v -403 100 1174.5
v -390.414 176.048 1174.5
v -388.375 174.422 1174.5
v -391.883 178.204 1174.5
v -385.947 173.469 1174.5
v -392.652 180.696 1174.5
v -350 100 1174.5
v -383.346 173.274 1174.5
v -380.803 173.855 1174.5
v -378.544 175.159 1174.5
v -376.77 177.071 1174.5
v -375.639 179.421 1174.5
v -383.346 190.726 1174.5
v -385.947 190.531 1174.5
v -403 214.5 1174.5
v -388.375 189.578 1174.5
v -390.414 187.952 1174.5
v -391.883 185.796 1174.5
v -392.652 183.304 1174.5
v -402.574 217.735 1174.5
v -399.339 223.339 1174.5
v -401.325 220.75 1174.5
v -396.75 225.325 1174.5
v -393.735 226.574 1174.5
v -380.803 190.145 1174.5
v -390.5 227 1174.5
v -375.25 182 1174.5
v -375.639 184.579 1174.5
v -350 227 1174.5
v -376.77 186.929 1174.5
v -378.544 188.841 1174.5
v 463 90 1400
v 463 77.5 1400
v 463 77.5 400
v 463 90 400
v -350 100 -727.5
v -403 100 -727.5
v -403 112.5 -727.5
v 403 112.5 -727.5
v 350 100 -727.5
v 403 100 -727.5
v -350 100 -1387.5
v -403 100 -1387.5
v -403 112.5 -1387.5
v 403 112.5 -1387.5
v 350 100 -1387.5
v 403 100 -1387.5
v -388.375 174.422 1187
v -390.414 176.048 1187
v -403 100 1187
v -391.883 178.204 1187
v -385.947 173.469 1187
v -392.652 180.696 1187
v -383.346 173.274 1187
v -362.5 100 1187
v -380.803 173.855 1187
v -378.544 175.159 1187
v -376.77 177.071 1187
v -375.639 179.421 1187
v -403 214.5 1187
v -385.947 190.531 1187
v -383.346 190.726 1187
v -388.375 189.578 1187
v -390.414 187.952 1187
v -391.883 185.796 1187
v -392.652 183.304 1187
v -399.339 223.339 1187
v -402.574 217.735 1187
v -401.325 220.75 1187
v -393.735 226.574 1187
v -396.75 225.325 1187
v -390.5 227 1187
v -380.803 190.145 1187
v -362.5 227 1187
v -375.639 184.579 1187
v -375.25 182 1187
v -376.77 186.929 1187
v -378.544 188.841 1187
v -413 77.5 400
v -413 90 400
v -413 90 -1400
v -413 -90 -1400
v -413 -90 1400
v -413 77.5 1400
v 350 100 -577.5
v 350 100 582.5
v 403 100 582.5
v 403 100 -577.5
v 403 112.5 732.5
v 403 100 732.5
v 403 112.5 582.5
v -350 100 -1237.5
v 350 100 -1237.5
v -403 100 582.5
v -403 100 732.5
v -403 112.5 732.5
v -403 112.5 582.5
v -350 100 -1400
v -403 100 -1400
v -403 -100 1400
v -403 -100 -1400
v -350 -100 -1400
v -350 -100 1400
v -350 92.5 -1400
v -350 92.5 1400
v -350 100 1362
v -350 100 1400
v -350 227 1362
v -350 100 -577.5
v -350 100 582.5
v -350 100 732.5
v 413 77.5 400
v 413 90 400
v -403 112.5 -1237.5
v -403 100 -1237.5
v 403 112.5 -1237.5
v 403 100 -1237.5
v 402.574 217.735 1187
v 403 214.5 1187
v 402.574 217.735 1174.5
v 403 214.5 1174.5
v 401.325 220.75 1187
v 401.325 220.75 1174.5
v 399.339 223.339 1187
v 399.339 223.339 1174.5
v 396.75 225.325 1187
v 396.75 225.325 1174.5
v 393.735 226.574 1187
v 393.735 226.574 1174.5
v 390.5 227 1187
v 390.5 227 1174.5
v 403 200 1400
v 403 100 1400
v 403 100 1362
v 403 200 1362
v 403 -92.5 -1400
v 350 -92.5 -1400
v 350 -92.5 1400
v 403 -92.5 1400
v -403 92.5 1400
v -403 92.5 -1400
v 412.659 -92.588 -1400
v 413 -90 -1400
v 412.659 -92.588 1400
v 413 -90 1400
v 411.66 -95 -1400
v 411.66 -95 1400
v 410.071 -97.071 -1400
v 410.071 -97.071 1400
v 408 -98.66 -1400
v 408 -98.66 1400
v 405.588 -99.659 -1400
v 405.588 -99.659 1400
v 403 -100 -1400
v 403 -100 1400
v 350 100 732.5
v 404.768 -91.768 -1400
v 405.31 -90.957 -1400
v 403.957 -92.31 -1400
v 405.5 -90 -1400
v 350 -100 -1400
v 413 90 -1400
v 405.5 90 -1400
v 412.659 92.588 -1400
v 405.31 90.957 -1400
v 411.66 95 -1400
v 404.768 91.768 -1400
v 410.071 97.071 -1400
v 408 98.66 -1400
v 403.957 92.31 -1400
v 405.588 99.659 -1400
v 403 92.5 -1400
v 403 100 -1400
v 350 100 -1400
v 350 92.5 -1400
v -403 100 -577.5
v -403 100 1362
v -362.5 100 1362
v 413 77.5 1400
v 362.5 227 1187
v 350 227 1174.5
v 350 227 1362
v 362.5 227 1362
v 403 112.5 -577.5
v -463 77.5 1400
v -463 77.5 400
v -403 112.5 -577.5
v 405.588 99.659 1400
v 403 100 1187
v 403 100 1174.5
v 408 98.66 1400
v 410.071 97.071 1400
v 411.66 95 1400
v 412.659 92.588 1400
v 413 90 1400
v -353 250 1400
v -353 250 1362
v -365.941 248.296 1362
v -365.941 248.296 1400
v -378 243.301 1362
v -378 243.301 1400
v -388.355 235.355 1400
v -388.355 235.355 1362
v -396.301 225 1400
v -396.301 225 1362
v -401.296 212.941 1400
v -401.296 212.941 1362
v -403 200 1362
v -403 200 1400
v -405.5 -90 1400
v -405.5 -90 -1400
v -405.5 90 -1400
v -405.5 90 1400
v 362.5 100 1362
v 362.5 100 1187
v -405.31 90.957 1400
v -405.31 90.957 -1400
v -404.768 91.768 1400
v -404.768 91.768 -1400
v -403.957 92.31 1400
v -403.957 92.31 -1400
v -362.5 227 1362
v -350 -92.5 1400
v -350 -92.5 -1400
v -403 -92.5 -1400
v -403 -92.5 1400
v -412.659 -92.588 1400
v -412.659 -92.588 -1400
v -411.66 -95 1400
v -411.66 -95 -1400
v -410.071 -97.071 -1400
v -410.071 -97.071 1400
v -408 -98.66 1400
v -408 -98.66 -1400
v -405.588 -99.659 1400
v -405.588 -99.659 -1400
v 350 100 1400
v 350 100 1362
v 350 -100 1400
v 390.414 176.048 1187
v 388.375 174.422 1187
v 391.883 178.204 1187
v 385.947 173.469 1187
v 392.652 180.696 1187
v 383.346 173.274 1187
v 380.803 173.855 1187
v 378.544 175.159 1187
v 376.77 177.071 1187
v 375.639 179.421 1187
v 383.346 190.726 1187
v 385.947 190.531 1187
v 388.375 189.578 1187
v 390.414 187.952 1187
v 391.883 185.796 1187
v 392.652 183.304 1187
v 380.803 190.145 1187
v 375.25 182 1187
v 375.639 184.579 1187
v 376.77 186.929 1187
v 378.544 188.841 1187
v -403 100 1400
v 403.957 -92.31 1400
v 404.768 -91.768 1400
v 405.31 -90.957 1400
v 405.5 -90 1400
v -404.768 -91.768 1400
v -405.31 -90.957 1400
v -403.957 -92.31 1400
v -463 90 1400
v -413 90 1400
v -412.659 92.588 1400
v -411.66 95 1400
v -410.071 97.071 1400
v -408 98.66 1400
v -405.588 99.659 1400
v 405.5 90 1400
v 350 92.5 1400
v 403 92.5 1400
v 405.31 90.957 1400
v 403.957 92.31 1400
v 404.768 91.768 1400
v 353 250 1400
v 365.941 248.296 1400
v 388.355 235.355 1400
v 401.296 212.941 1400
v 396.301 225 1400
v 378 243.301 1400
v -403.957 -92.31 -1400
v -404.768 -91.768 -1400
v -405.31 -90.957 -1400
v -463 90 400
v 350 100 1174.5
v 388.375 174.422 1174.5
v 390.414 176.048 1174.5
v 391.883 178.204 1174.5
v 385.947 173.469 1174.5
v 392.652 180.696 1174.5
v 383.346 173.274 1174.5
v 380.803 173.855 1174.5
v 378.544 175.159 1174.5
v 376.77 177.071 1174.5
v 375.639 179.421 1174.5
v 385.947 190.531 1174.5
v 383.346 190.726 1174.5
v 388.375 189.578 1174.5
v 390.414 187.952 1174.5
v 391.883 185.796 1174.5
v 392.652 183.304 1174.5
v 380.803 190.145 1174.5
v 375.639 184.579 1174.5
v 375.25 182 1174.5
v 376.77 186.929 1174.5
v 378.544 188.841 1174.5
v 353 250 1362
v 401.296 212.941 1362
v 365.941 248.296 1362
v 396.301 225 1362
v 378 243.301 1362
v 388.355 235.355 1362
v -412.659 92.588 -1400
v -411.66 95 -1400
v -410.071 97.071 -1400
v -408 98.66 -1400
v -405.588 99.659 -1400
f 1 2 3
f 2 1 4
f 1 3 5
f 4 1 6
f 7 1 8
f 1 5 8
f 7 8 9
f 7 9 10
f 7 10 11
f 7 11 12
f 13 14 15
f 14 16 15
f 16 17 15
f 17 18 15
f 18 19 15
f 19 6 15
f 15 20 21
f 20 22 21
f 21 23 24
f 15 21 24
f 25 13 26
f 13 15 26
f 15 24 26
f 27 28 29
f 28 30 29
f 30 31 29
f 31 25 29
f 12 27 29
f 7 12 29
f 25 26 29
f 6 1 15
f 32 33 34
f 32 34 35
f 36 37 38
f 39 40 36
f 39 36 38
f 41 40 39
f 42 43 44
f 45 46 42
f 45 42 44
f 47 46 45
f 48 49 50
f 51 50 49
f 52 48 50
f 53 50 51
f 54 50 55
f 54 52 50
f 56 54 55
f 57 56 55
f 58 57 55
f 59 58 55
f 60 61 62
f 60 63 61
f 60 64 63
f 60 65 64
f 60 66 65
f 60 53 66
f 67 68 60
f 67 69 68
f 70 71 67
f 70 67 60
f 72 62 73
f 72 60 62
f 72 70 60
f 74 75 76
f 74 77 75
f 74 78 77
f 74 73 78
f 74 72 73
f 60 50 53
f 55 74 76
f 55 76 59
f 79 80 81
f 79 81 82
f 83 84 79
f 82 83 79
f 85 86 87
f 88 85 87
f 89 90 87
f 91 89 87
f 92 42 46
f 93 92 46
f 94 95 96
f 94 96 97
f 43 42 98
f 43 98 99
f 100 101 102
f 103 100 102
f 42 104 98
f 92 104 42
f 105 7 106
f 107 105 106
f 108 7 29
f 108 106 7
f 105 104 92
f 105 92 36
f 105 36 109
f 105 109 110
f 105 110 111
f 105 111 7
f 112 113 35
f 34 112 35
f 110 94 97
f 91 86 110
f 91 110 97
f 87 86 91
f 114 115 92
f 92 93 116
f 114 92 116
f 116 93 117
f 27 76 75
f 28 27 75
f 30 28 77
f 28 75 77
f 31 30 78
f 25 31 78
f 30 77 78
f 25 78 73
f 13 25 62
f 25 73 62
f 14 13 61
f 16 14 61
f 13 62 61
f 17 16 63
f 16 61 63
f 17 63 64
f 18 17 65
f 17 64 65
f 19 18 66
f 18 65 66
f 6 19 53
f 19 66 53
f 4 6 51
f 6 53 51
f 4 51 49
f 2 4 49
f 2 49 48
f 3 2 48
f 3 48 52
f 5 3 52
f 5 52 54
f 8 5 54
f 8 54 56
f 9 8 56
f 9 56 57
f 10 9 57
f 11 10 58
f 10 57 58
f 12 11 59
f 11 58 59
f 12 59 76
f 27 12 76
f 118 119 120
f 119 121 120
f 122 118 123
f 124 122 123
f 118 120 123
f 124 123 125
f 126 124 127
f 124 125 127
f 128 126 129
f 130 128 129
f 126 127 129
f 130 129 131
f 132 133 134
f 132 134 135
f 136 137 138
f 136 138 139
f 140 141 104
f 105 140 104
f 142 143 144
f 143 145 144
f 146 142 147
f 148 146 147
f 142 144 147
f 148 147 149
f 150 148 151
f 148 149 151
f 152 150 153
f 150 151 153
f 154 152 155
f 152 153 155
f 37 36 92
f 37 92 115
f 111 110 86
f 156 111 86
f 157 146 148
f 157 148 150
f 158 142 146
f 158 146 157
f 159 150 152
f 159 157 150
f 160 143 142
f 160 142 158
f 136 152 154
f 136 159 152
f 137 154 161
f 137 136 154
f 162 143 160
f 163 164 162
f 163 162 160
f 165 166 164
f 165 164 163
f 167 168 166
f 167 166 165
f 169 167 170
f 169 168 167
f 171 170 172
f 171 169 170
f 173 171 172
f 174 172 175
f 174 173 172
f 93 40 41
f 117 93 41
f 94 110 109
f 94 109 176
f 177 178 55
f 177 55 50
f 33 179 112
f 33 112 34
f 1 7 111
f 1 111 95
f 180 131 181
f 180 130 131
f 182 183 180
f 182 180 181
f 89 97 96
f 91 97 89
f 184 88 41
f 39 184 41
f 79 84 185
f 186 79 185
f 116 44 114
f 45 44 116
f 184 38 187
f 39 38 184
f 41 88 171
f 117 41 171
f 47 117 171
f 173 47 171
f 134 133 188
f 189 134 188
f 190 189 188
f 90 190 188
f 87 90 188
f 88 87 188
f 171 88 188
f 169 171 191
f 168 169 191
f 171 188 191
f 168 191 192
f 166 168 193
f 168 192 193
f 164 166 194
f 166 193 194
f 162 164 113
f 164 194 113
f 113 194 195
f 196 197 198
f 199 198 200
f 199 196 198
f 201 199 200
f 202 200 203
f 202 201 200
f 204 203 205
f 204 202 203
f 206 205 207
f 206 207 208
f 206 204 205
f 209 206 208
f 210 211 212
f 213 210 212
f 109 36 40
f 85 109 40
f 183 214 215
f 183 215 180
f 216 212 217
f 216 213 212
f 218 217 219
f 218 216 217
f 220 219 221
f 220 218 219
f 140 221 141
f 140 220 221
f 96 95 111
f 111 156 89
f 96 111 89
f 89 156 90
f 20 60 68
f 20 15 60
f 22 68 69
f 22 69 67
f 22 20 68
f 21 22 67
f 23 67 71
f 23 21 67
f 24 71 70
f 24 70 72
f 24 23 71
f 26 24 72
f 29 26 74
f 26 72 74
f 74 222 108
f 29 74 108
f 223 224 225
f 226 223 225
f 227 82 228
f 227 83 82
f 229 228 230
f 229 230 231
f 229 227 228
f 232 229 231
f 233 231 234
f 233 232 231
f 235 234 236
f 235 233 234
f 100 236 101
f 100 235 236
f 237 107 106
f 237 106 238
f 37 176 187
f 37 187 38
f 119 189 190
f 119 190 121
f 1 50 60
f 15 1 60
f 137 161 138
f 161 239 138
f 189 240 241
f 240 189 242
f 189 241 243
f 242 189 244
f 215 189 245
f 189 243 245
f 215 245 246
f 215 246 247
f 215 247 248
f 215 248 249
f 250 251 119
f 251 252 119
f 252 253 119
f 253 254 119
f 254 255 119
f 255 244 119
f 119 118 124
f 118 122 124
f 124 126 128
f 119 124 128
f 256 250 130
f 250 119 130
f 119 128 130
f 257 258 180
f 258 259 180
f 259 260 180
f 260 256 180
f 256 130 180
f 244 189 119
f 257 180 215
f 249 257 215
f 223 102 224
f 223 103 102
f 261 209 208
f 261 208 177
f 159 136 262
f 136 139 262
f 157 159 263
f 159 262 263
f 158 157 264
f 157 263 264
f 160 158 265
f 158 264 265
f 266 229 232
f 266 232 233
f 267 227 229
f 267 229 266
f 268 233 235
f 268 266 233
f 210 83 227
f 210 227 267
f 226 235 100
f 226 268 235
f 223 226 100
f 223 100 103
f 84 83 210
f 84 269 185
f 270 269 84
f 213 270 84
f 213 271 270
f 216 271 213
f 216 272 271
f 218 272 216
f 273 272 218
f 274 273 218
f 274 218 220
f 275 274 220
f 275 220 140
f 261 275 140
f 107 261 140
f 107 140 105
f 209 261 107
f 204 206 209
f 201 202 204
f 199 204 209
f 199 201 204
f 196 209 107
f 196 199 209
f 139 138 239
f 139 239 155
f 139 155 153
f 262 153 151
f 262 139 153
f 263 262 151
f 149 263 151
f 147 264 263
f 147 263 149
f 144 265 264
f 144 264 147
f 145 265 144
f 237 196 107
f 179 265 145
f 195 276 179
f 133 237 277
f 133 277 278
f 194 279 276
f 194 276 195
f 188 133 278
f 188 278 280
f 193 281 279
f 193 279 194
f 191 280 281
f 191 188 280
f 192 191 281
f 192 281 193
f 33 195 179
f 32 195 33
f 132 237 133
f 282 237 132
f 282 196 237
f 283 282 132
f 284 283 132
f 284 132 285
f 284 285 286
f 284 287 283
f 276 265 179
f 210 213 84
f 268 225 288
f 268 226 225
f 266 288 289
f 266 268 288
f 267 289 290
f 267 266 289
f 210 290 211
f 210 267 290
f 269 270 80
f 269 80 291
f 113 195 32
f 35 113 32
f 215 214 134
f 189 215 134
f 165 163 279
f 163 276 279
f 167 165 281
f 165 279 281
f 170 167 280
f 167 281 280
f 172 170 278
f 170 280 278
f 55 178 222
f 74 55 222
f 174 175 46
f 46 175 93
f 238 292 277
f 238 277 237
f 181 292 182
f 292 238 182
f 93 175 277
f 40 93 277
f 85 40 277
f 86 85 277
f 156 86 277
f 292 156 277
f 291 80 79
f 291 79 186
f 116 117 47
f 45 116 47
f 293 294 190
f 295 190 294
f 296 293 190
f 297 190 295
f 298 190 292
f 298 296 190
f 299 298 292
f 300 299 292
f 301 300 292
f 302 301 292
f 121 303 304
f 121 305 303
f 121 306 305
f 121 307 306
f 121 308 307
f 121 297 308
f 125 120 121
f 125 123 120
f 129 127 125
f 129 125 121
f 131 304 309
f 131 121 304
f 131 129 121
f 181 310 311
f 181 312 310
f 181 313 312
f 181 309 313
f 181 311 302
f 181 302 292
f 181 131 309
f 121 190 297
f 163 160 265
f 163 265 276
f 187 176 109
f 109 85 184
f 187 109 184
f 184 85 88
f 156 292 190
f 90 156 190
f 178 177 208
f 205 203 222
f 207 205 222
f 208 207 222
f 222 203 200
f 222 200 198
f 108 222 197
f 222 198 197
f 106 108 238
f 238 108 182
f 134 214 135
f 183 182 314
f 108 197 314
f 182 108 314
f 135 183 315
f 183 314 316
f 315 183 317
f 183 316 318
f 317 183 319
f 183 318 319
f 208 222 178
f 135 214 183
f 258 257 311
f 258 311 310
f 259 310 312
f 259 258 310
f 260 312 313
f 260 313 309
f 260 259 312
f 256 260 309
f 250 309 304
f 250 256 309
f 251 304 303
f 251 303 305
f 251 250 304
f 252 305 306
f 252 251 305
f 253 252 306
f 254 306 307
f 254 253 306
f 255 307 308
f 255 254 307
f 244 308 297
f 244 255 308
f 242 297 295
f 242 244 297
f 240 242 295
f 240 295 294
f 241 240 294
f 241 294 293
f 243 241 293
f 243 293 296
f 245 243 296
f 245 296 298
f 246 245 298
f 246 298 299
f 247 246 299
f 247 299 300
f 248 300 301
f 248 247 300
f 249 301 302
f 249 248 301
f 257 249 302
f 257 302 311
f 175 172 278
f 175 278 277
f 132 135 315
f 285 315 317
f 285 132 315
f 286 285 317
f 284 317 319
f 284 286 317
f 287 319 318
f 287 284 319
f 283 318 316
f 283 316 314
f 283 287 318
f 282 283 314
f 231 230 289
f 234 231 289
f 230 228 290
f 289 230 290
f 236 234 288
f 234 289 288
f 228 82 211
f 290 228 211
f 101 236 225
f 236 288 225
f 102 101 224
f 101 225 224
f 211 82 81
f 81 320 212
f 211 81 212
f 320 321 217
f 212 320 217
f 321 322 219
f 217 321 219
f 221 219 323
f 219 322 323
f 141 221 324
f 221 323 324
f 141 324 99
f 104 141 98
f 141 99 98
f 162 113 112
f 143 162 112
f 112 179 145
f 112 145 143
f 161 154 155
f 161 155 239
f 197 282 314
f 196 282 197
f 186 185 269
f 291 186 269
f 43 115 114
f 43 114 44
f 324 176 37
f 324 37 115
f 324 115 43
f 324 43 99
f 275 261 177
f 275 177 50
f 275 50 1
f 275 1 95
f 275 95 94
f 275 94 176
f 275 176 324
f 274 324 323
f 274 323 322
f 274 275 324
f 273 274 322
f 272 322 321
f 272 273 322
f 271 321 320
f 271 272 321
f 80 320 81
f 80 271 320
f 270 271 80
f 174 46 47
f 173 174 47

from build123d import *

# Parameters (mm, degrees)
EXTRUDE_THIN1_DEPTH  = 1400
SKETCH2_W            = 50
SKETCH2_H            = 12.5
BOSS_EXTRUDE1_DEPTH  = 1000
BOSS_EXTRUDE2_DEPTH  = 38
SKETCH4_W            = 806
SKETCH4_H            = 150
BOSS_EXTRUDE3_DEPTH  = 12.5
LPATTERN1_COUNT      = 2
LPATTERN1_PITCH      = 660
LPATTERN2_COUNT      = 2
LPATTERN2_PITCH      = 1970
SKETCH5_W            = 12.5
SKETCH5_H            = 127
BOSS_EXTRUDE4_DEPTH  = 175
SKETCH6_W            = 53
SKETCH6_H            = 127
SKETCH6_R            = 8.75
BOSS_EXTRUDE5_DEPTH  = 12.5
FILLET1_R            = 12.5
FILLET1_OF_MIRROR3_R = 12.5


with BuildPart() as part:
    # Sketch1 → Extrude-Thin1 (new, symmetric)
    with BuildSketch(Plane.XY):
        with BuildLine():
            Line((350, 100), (403, 100))
            ThreePointArc((403, 100), (410.071067812, 97.071067812), (413, 90))
            Line((413, 90), (413, -90))
            ThreePointArc((413, -90), (410.071067812, -97.071067812), (403, -100))
            Line((403, -100), (350, -100))
            Line((350, -100), (350, -92.5))
            Line((350, -92.5), (403, -92.5))
            ThreePointArc((403, -92.5), (404.767766953, -91.767766953), (405.5, -90))
            Line((405.5, -90), (405.5, 90))
            ThreePointArc((405.5, 90), (404.767766953, 91.767766953), (403, 92.5))
            Line((403, 92.5), (350, 92.5))
            Line((350, 92.5), (350, 100))
        make_face()
    extrude(amount=EXTRUDE_THIN1_DEPTH, both=True)

    # Sketch2 → Boss-Extrude1 (add)
    with BuildSketch(Plane.XY.offset(1400)):
        with Locations((438, 83.75)):
            Rectangle(SKETCH2_W, SKETCH2_H)
    extrude(amount=-BOSS_EXTRUDE1_DEPTH)


with BuildPart() as body_2:
    # Mirror2: mirrored copy
    add(part.part.mirror(Plane(origin=(0, 0, 0), x_dir=(0, 0, 1), z_dir=(1, 0, 0))))


with BuildPart() as part_1:
    add(part.part)

    add(body_2.part)  # Boss-Extrude2 merges body 2
    # Sketch3 → Boss-Extrude2 (add)
    with BuildSketch(Plane.XY.offset(1400)):
        with BuildLine():
            Line((-403, 100), (403, 100))
            Line((403, 100), (403, 200))
            ThreePointArc((403, 200), (388.355339059, 235.355339059), (353, 250))
            Line((353, 250), (-353, 250))
            ThreePointArc((-353, 250), (-388.355339059, 235.355339059), (-403, 200))
            Line((-403, 200), (-403, 100))
        make_face()
    extrude(amount=-BOSS_EXTRUDE2_DEPTH)

    # Sketch4 → Boss-Extrude3 (add)
    with BuildSketch(Plane(origin=(0, 100, 0), x_dir=(1, 0, 0), z_dir=(0, 1, 0))):
        with Locations((0, 1312.5)):
            Rectangle(SKETCH4_W, SKETCH4_H)
    boss_extrude3 = extrude(amount=BOSS_EXTRUDE3_DEPTH)

    # LPattern1: Boss-Extrude3 ×2
    with Locations(*[(0, 0, i * LPATTERN1_PITCH) for i in range(1, LPATTERN1_COUNT)]):
        add(boss_extrude3)

    # LPattern2: Boss-Extrude3 ×2
    with Locations(*[(0, 0, i * LPATTERN2_PITCH) for i in range(1, LPATTERN2_COUNT)]):
        add(boss_extrude3)

    # Sketch5 → Boss-Extrude4 (add)
    with BuildSketch(Plane(origin=(0, 0, 1362), x_dir=(-1, 0, 0), z_dir=(0, 0, -1))):
        with Locations((-356.25, 163.5)):
            Rectangle(SKETCH5_W, SKETCH5_H)
    boss_extrude4 = extrude(amount=BOSS_EXTRUDE4_DEPTH)

    # Sketch6 → Boss-Extrude5 (add)
    with BuildSketch(Plane(origin=(0, 0, 1187), x_dir=(-1, 0, 0), z_dir=(0, 0, -1))):
        with Locations((-376.5, 163.5)):
            Rectangle(SKETCH6_W, SKETCH6_H)
        with Locations((-384, 182)):
            Circle(SKETCH6_R, mode=Mode.SUBTRACT)
    boss_extrude5 = extrude(amount=BOSS_EXTRUDE5_DEPTH)

    # Fillet1
    fillet1_edges = [part_1.edges().sort_by_distance(p)[0] for p in [
        (403, 227, 1180.75),
    ]]
    fillet(fillet1_edges, radius=FILLET1_R)

    # Mirror3: Boss-Extrude4, Boss-Extrude5 across plane
    add(boss_extrude4.mirror(Plane(origin=(0, 0, 0), x_dir=(0, 0, 1), z_dir=(1, 0, 0))))
    add(boss_extrude5.mirror(Plane(origin=(0, 0, 0), x_dir=(0, 0, 1), z_dir=(1, 0, 0))))

    # Fillet1 of Mirror3
    fillet1_of_mirror3_edges = [part_1.edges().sort_by_distance(p)[0] for p in [
        (-403, 227, 1180.75),
    ]]
    fillet(fillet1_of_mirror3_edges, radius=FILLET1_OF_MIRROR3_R)


solid = part_1.part
